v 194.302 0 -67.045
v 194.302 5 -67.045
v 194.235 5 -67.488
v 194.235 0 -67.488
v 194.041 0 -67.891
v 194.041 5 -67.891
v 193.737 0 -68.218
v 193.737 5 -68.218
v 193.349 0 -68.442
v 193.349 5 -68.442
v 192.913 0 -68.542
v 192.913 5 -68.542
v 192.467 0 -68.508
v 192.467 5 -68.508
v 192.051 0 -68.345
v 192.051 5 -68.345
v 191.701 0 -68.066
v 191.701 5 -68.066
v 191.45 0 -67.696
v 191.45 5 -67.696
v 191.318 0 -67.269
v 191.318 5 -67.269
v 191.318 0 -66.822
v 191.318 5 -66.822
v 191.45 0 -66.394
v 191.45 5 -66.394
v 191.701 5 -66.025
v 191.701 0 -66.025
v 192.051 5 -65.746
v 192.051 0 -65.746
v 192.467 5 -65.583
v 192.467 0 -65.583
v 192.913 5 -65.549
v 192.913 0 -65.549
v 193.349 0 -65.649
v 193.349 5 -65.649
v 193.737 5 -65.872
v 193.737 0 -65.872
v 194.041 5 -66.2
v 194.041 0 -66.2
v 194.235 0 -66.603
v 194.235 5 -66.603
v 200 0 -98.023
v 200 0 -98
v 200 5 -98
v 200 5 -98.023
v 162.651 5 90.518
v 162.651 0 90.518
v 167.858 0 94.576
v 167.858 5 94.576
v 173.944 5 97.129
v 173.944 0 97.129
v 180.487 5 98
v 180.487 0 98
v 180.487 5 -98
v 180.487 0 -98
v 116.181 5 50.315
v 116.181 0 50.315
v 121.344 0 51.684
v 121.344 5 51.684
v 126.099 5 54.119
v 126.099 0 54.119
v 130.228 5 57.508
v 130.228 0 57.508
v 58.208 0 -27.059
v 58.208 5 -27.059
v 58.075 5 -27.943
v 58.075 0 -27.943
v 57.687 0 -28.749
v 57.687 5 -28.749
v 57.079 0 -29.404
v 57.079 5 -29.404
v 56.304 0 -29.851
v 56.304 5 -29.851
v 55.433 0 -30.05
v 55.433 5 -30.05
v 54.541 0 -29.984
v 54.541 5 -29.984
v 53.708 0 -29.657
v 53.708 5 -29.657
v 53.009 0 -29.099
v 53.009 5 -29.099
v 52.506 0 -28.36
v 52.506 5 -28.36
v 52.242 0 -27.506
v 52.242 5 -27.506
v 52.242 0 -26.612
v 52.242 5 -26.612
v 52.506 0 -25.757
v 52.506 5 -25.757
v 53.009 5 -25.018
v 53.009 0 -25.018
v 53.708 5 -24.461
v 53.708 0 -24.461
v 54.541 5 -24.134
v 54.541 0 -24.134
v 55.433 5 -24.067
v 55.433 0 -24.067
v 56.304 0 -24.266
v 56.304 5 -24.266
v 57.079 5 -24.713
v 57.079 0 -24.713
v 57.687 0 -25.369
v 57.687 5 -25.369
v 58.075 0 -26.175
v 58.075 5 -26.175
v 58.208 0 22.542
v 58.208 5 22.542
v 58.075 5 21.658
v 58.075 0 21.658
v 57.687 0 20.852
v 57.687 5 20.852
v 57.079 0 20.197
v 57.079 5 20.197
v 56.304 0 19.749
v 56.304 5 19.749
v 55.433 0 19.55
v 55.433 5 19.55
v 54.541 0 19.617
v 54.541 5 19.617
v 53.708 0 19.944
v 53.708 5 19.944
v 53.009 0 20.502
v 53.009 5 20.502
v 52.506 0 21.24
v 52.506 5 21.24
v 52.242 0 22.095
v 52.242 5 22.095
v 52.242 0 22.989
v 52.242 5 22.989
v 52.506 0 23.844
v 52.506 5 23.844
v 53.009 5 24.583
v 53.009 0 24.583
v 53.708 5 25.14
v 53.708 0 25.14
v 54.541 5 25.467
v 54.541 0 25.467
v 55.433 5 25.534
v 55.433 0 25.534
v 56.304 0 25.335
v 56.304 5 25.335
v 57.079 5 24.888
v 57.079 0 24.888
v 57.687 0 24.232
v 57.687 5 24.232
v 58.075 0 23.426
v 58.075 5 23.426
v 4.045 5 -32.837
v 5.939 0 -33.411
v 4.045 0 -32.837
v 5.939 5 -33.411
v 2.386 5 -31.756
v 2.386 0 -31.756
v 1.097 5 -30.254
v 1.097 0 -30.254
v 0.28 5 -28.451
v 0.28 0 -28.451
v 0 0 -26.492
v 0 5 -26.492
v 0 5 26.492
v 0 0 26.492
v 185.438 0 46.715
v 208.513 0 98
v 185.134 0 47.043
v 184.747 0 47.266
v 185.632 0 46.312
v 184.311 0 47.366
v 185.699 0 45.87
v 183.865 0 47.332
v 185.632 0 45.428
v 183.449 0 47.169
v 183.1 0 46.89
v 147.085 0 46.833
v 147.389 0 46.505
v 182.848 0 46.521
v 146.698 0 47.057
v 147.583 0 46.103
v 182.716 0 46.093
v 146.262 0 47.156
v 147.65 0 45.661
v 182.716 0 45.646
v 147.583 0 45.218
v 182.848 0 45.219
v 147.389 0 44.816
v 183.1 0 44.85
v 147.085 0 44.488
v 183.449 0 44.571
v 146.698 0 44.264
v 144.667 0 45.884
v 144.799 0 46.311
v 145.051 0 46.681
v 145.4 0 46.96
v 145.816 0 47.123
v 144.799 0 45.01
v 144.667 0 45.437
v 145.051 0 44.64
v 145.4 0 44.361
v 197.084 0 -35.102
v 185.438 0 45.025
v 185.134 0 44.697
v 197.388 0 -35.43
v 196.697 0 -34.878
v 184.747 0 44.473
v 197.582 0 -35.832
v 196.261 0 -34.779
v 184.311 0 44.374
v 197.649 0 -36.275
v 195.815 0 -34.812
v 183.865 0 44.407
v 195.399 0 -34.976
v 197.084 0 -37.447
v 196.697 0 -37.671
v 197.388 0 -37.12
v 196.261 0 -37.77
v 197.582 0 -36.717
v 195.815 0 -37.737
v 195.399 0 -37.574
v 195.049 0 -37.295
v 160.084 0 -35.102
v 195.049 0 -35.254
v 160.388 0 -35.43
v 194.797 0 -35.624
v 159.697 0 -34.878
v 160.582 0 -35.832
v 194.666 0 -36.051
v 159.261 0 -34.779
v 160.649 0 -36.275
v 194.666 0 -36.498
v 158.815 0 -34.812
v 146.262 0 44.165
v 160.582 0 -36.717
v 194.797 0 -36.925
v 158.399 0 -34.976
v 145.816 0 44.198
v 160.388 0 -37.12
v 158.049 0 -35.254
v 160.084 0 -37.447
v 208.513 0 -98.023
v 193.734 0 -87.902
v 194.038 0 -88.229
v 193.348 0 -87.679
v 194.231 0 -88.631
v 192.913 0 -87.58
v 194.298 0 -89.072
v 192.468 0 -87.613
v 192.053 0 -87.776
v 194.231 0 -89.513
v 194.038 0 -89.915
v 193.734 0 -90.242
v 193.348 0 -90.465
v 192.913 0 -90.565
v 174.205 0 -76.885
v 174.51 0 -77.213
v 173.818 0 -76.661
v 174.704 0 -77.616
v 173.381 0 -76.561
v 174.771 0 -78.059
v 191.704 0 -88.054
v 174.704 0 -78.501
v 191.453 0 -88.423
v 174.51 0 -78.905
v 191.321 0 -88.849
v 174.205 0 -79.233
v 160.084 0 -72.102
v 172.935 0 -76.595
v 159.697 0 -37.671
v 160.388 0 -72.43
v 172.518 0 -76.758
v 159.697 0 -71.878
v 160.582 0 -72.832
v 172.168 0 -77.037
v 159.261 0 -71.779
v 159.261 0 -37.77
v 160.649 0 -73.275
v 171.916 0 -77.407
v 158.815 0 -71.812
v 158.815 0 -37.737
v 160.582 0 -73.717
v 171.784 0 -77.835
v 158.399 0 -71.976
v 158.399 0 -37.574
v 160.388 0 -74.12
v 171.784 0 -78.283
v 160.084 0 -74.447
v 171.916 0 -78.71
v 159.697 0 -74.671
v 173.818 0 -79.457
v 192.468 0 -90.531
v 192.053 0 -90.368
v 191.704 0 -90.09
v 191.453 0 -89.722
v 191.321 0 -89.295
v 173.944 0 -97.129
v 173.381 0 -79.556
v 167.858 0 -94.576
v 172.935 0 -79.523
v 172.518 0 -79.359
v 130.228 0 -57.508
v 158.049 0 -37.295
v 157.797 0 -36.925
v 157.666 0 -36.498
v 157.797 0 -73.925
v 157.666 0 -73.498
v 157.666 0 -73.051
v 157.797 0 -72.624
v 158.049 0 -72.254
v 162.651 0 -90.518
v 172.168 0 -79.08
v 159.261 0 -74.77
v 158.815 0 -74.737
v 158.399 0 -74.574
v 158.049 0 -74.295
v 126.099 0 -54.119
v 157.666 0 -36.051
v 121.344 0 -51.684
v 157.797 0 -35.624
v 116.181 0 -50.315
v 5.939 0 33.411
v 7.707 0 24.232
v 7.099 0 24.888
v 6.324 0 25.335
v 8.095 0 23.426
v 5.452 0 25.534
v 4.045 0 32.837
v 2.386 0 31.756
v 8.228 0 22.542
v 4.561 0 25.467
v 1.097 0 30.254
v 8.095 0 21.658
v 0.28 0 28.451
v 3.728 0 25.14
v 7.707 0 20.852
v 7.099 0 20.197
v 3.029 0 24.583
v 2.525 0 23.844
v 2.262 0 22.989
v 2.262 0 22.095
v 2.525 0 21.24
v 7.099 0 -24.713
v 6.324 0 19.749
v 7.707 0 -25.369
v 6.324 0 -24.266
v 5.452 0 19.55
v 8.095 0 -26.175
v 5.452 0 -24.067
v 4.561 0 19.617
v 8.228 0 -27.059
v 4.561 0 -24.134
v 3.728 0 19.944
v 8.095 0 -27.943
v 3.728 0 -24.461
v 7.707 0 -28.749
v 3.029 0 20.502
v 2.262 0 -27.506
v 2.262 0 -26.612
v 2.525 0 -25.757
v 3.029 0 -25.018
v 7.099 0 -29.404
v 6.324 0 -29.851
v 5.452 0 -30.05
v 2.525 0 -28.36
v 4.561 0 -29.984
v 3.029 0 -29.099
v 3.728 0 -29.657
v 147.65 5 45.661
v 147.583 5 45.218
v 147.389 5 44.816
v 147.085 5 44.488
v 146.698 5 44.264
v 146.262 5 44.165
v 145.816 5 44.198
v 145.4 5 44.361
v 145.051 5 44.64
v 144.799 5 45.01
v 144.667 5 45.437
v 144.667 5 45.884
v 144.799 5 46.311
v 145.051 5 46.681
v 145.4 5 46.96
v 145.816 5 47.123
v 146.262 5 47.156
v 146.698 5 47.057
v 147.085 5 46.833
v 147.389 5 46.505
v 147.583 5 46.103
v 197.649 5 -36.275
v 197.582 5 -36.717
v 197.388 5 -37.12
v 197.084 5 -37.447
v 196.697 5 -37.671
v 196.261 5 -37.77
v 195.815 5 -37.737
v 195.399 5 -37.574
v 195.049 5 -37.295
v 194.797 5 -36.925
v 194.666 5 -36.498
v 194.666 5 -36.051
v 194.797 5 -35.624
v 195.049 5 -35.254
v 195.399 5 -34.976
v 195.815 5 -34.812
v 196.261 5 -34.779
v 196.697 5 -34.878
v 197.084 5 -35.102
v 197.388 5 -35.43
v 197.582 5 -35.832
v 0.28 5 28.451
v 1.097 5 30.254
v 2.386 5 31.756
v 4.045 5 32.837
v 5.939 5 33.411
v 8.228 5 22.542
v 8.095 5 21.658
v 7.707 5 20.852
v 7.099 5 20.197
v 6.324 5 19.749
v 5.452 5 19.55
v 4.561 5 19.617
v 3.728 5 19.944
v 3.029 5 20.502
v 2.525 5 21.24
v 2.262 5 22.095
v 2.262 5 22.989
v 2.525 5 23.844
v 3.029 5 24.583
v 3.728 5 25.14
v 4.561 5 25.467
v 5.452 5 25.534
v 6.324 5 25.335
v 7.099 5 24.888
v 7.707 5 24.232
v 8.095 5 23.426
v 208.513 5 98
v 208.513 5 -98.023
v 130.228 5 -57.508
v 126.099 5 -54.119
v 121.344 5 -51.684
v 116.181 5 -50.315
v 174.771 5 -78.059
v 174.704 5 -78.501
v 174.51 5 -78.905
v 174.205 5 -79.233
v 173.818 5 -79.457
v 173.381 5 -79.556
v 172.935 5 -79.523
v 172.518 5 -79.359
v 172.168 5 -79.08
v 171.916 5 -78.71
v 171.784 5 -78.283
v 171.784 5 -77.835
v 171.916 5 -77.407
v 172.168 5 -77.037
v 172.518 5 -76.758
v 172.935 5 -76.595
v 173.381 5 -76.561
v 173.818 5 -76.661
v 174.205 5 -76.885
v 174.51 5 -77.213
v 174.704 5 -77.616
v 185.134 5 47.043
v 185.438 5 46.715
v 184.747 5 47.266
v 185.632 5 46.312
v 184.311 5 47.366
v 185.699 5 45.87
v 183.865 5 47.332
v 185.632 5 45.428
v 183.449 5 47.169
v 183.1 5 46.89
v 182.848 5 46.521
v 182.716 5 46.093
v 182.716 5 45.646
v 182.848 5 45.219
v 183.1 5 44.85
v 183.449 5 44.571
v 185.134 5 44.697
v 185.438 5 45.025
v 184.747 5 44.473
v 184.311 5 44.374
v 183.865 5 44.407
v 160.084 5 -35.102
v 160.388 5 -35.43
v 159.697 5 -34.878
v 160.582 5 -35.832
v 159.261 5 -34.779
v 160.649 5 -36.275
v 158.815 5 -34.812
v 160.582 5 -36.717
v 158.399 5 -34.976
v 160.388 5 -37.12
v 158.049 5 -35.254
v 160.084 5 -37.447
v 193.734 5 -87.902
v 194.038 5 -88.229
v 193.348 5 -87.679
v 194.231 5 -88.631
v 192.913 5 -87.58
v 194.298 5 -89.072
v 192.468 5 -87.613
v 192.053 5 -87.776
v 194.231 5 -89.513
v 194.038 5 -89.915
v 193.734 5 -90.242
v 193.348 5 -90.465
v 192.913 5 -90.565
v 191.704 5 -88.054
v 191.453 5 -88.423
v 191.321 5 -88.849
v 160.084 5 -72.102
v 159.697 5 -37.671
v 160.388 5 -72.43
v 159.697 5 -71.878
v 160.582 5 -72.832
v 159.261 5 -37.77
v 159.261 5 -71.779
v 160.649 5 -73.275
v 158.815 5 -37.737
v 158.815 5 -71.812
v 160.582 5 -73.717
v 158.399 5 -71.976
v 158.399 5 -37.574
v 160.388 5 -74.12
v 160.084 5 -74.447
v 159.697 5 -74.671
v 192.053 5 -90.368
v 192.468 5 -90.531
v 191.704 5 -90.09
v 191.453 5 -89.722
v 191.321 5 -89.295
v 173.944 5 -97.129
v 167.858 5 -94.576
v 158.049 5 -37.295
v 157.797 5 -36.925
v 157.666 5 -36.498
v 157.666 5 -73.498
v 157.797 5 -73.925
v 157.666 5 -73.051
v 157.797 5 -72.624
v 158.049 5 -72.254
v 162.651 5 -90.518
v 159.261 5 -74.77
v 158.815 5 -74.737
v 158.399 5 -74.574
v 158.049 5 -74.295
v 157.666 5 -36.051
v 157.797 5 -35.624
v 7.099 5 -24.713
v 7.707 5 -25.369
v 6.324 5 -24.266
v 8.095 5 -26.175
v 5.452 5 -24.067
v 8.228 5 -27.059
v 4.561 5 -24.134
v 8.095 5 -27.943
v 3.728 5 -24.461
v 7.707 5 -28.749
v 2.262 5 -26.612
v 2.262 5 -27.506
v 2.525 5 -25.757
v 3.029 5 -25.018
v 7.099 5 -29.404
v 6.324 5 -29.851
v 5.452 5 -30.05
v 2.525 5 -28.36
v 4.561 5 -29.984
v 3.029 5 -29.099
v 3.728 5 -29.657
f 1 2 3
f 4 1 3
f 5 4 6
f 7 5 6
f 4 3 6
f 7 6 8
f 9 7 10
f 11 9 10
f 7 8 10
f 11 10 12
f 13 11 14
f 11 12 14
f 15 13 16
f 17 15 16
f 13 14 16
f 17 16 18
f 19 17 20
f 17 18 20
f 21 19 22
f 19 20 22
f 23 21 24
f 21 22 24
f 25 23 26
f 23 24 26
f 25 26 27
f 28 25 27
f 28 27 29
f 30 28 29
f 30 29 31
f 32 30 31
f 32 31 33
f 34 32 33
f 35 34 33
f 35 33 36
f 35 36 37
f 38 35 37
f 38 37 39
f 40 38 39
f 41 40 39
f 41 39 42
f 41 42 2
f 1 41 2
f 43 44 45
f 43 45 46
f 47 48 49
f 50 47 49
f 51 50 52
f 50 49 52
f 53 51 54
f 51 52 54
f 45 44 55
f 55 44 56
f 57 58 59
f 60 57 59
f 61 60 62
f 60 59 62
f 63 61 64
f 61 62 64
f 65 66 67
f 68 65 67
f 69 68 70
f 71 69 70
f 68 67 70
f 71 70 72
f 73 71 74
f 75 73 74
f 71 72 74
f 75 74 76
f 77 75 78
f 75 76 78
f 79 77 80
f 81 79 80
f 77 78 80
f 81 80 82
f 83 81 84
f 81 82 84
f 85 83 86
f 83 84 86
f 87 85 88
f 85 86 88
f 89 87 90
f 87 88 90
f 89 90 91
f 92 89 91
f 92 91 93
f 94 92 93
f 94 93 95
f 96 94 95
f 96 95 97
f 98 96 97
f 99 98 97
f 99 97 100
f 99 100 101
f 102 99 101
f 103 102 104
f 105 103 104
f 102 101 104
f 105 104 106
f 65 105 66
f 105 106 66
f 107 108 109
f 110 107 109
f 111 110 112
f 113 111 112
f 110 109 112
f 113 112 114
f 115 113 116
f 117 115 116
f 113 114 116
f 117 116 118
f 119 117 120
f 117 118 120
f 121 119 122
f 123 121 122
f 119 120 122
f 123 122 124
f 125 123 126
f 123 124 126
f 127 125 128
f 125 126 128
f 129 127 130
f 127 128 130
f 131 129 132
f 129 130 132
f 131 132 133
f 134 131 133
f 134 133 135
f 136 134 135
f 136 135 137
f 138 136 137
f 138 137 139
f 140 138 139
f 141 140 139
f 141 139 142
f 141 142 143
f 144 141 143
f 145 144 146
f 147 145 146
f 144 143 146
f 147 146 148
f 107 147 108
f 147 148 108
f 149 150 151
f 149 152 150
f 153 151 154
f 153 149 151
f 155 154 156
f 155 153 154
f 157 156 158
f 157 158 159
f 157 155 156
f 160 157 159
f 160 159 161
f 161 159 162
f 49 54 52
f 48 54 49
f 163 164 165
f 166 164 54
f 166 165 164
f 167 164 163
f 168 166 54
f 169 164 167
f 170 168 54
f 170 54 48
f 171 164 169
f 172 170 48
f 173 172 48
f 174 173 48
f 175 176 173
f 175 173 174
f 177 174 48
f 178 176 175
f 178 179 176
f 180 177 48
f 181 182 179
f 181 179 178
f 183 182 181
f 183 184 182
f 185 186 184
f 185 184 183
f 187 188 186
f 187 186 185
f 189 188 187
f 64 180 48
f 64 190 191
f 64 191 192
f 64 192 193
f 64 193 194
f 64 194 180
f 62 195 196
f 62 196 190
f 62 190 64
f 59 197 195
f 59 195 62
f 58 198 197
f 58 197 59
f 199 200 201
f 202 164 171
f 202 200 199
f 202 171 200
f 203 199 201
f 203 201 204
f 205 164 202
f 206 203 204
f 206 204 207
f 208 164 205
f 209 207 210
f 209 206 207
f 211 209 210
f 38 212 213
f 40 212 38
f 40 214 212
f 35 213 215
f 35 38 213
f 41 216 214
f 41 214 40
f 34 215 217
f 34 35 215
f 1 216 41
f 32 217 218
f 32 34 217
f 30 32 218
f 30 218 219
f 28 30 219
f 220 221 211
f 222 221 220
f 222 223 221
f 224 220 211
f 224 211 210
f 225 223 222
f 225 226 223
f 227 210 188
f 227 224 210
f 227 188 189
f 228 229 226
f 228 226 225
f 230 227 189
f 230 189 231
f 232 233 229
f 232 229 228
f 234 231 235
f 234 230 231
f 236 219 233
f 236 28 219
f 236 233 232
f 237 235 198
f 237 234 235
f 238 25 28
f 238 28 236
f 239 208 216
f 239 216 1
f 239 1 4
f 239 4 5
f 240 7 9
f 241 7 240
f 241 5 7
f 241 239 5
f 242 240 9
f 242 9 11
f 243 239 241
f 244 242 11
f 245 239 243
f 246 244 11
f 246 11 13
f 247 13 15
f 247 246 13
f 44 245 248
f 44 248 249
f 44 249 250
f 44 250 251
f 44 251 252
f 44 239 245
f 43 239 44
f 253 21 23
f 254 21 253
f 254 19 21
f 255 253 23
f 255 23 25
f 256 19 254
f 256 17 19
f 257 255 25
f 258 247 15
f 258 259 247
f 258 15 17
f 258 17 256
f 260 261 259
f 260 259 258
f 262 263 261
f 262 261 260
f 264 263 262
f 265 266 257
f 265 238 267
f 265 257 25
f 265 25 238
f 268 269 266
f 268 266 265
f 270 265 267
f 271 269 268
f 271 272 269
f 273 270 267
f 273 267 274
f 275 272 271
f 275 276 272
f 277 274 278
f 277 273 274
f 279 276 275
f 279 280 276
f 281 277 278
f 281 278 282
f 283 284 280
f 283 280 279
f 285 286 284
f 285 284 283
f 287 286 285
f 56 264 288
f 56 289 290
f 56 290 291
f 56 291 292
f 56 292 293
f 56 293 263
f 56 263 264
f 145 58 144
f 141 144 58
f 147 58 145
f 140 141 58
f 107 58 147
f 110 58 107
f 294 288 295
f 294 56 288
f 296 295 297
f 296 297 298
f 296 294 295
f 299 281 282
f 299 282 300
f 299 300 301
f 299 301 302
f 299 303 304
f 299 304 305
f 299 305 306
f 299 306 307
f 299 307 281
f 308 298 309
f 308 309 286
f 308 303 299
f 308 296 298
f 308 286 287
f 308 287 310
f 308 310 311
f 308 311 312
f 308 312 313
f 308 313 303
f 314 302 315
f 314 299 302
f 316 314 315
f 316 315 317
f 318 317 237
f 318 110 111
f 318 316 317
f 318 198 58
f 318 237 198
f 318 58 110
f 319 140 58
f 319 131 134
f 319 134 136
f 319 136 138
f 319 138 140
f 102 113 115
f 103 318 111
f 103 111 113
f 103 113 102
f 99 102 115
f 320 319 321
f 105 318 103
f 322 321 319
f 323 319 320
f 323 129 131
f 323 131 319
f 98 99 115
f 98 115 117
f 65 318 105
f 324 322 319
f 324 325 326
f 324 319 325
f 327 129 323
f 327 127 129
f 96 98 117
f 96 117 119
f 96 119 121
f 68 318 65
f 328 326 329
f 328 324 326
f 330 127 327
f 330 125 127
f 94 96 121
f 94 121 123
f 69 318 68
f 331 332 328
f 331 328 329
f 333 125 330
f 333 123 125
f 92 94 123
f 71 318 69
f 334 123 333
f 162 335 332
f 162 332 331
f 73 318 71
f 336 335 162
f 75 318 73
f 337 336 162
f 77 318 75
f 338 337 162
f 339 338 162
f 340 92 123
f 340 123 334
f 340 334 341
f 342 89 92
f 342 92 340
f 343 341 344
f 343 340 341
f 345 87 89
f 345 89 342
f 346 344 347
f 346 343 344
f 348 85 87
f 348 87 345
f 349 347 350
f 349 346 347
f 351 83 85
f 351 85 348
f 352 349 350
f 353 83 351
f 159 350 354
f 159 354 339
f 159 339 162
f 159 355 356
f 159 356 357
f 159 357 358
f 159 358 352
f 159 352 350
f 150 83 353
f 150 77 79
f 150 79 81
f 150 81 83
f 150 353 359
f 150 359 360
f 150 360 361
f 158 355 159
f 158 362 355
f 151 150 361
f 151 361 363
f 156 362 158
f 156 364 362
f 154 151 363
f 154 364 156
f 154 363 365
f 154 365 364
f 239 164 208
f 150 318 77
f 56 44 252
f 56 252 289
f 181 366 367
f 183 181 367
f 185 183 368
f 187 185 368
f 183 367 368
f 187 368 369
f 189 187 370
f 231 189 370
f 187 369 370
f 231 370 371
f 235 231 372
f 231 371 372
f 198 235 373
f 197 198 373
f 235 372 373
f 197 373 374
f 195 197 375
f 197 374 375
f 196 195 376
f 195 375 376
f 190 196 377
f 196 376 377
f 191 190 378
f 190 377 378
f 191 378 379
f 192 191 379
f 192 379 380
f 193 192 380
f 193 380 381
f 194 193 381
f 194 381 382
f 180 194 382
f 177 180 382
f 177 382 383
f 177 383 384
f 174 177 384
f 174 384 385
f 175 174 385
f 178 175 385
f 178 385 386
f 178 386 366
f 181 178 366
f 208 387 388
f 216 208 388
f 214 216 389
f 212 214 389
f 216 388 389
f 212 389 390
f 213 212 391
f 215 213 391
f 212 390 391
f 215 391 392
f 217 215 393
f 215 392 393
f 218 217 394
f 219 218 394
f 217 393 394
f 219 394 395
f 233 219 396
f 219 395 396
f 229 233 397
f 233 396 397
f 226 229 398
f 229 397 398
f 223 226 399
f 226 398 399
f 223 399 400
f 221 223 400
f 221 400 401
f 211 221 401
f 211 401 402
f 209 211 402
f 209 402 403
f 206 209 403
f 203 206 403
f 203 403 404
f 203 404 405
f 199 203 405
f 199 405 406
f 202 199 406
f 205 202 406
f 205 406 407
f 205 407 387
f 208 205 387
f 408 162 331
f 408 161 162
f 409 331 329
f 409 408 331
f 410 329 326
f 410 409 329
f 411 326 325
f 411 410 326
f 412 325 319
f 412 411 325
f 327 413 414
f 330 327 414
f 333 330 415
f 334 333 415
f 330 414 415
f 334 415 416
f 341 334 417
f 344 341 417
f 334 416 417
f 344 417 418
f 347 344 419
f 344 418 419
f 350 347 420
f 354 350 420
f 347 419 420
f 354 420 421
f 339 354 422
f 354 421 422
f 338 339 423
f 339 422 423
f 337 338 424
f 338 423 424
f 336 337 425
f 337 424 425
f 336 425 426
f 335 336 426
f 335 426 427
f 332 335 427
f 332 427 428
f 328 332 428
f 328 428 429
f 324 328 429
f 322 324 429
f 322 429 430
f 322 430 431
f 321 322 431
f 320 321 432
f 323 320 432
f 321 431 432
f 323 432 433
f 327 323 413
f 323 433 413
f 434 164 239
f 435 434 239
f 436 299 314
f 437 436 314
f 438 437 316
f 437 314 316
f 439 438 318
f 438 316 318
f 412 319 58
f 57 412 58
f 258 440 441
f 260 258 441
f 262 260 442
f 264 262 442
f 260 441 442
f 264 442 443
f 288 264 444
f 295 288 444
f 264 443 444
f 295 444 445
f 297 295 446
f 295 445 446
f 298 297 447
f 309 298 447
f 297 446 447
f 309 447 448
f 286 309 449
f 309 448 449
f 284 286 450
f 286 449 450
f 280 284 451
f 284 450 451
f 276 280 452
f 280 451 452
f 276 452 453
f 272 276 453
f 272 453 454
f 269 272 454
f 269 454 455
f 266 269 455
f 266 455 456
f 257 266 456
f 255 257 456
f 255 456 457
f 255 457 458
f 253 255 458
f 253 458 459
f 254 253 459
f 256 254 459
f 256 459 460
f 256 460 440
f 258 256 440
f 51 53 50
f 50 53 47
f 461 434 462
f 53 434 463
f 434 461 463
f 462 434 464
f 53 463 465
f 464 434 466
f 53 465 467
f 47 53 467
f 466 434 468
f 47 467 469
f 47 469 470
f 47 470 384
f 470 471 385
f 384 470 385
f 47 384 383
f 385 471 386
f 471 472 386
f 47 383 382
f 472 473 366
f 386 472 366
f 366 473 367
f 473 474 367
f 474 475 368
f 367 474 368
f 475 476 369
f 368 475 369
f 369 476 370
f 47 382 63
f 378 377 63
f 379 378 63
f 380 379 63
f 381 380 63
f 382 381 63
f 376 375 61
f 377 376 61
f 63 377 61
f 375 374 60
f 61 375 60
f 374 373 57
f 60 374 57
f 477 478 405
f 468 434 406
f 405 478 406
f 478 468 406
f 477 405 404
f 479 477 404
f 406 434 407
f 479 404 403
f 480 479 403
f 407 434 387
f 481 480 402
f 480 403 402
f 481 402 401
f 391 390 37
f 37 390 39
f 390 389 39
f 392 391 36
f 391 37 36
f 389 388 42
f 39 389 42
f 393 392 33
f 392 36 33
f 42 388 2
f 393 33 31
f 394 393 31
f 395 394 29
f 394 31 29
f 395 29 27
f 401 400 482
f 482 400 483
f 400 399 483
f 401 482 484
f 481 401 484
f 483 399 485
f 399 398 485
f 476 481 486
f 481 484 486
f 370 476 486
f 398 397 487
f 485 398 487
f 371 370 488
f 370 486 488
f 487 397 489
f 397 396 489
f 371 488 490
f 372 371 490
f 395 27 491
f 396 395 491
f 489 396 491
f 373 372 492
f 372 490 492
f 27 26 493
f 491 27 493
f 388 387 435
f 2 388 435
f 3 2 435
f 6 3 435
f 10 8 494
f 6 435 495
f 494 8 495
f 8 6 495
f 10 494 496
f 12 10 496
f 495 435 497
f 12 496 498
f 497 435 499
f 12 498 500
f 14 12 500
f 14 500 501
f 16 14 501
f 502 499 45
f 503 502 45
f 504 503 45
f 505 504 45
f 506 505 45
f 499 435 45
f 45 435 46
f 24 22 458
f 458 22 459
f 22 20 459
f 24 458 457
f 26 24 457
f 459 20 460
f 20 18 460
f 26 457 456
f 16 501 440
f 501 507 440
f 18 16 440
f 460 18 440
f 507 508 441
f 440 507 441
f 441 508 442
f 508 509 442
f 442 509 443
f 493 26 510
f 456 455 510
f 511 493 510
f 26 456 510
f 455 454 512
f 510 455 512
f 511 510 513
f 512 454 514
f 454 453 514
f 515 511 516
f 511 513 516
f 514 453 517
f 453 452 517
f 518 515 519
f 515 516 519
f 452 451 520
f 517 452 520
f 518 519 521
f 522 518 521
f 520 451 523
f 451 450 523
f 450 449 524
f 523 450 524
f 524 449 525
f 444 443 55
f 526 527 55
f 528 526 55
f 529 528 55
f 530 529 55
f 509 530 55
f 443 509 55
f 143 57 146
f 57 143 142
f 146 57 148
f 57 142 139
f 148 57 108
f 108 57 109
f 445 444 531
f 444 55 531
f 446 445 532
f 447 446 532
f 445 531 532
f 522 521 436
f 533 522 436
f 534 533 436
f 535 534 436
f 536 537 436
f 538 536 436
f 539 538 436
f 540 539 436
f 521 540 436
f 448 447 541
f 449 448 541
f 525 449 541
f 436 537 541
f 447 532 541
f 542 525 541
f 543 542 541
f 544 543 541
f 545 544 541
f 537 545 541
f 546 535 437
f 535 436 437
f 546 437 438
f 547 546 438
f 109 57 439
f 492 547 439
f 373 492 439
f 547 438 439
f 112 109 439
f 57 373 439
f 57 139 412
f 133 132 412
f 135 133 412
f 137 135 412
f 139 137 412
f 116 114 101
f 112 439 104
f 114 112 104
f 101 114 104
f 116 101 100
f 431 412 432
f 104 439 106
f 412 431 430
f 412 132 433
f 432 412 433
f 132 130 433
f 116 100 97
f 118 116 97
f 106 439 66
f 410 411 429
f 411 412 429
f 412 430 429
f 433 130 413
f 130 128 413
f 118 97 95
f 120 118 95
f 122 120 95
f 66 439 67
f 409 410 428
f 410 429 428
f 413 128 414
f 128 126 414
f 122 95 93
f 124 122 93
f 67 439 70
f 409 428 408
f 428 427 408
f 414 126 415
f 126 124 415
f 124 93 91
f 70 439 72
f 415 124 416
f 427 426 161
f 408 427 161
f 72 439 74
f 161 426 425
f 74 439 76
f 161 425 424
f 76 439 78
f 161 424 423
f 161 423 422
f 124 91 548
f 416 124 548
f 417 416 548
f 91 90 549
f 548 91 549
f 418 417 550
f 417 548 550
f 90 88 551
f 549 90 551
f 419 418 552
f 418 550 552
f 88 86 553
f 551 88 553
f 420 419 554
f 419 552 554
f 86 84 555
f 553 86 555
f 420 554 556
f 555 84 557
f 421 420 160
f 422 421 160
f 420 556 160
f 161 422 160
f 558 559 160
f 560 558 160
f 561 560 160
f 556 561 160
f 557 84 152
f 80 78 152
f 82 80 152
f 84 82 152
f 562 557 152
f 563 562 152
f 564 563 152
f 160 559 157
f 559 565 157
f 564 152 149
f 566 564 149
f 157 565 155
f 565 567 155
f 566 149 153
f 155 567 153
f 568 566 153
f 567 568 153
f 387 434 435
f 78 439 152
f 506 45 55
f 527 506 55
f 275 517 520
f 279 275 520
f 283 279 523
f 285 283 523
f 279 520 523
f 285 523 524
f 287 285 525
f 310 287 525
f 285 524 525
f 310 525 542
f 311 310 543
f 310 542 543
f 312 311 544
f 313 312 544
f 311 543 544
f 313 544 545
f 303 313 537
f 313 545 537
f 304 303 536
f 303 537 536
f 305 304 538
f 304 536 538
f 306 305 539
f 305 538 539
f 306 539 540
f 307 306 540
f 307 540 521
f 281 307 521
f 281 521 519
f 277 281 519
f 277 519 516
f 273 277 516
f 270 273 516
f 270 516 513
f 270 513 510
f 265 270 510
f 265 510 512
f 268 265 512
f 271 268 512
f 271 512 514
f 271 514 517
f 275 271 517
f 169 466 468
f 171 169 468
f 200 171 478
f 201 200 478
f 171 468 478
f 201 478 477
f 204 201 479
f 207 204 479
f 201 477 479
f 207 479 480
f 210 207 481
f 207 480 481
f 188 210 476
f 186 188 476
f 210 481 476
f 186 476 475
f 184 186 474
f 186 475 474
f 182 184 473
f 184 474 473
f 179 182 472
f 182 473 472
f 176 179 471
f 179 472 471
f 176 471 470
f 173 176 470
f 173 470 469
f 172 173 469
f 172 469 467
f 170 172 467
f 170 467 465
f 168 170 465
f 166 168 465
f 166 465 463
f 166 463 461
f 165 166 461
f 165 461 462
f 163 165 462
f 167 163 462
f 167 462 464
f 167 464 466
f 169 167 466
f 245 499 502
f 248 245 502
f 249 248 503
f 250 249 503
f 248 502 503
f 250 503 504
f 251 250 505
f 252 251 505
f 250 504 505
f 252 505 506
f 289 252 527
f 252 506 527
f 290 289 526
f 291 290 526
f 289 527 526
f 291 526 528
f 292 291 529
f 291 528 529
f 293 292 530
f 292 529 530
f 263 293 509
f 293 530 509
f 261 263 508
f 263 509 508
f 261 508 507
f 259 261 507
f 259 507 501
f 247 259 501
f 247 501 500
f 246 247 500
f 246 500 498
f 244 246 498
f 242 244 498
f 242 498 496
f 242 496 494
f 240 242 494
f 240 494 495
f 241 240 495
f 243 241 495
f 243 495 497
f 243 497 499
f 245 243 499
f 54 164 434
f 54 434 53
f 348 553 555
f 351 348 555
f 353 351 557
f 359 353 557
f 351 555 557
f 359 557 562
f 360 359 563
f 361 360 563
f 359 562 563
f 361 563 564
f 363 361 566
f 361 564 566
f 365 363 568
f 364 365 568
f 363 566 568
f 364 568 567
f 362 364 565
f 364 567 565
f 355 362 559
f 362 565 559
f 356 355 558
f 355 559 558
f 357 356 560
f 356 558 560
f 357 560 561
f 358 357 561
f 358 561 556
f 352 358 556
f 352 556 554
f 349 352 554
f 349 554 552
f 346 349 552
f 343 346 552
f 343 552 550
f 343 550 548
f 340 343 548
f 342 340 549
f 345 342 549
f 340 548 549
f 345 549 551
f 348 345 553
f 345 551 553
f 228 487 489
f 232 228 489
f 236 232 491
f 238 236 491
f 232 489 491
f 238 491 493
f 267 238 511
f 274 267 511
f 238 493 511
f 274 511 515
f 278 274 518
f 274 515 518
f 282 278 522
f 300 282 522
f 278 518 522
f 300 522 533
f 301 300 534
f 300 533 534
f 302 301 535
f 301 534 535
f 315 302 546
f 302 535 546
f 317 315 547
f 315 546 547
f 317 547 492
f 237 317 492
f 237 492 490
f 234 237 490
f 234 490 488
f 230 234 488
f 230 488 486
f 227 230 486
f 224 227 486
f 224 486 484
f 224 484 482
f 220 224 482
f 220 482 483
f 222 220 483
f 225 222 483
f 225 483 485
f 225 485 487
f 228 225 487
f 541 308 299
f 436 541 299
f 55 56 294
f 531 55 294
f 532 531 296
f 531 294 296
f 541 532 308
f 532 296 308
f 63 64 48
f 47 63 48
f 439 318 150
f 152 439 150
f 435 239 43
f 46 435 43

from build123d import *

# Parameters (mm, degrees)
BOSS_EXTRU_1_DEPTH      = 5
CONG_3_R                = 7
ESQUISSE3_R             = 3
ENL_V_MAT_EXTRU_1_DEPTH = 5
ESQUISSE8_R             = 1.5
ENL_V_MAT_EXTRU_5_DEPTH = 10
ESQUISSE11_R            = 1.5
ENL_V_MAT_EXTRU_7_DEPTH = 10
ESQUISSE12_W            = 8.513232075
ESQUISSE12_H            = 196.02308235
BOSS_EXTRU_2_DEPTH      = 5
ESQUISSE13_R            = 1.496707183
ESQUISSE13_R_2          = 1.50175208
ESQUISSE13_R_3          = 1.500339551
ENL_V_MAT_EXTRU_8_DEPTH = 10


with BuildPart() as part:
    # Esquisse1 → Boss.-Extru.1 (new body)
    with BuildSketch(Plane(origin=(0, 0, 0), x_dir=(1, 0, 0), z_dir=(0, 1, 0))):
        with BuildLine():
            Line((200, 98), (180.486918987, 98))
            ThreePointArc((180.486918987, 98), (170.816361757, 96.053857006), (162.651427502, 90.518425828))
            Line((162.651427502, 90.518425828), (130.227508241, 57.507666668))
            ThreePointArc((130.227508241, 57.507666668), (123.786759953, 52.773905469), (116.181163829, 50.314913559))
            Line((116.181163829, 50.314913559), (0, 32.5))
            Line((0, 32.5), (0, 19.62474242))
            Line((0, 19.62474242), (0, -19.62474242))
            Line((0, -19.62474242), (0, -32.5))
            Line((0, -32.5), (116.181163829, -50.314913559))
            ThreePointArc((116.181163829, -50.314913559), (123.786759953, -52.773905469), (130.227508241, -57.507666668))
            Line((130.227508241, -57.507666668), (162.651427502, -90.518425828))
            ThreePointArc((162.651427502, -90.518425828), (170.816361757, -96.053857006), (180.486918987, -98))
            Line((180.486918987, -98), (200, -98))
            Line((200, -98), (200, 98))
        make_face()
    extrude(amount=BOSS_EXTRU_1_DEPTH)

    # Congé3
    cong_3_edges = [part.edges().sort_by_distance(p)[0] for p in [
        (0, 2.5, 32.5),
        (0, 2.5, -32.5),
    ]]
    fillet(cong_3_edges, radius=CONG_3_R)

    # Esquisse3 → Enlèv. mat.-Extru.1 (cut)
    with BuildSketch(Plane(origin=(0, 5, 0), x_dir=(1, 0, 0), z_dir=(0, 1, 0))):
        with Locations((5.228132429, -22.542085275)):
            Circle(ESQUISSE3_R)
        with Locations((5.228132429, 27.05879269)):
            Circle(ESQUISSE3_R)
        with Locations((55.20842969, -22.542085275)):
            Circle(ESQUISSE3_R)
        with Locations((55.20842969, 27.05879269)):
            Circle(ESQUISSE3_R)
    extrude(amount=-ENL_V_MAT_EXTRU_1_DEPTH, mode=Mode.SUBTRACT)

    # Esquisse8 → Enlèv. mat.-Extru.5 (cut)
    with BuildSketch(Plane(origin=(0, 5, 0), x_dir=(1, 0, 0), z_dir=(0, 1, 0))):
        with Locations((196.148923391, 36.274574464)):
            Circle(ESQUISSE8_R)
        with Locations((159.148923391, 73.274574464)):
            Circle(ESQUISSE8_R)
        with Locations((159.148923391, 36.274574464)):
            Circle(ESQUISSE8_R)
    extrude(amount=-ENL_V_MAT_EXTRU_5_DEPTH, mode=Mode.SUBTRACT)

    # Esquisse11 → Enlèv. mat.-Extru.7 (cut)
    with BuildSketch(Plane(origin=(0, 5, 0), x_dir=(1, 0, 0), z_dir=(0, 1, 0))):
        with Locations((184.199116652, -45.869762424)):
            Circle(ESQUISSE11_R)
        with Locations((146.150097665, -45.660518454)):
            Circle(ESQUISSE11_R)
    extrude(amount=-ENL_V_MAT_EXTRU_7_DEPTH, mode=Mode.SUBTRACT)

    # Esquisse12 → Boss.-Extru.2 (add)
    with BuildSketch(Plane(origin=(0, 0, 0), x_dir=(-1, 0, 0), z_dir=(0, -1, 0))):
        with Locations((-204.256616038, 0.011541175)):
            Rectangle(ESQUISSE12_W, ESQUISSE12_H)
    extrude(amount=-BOSS_EXTRU_2_DEPTH)

    # Esquisse13 → Enlèv. mat.-Extru.8 (cut)
    with BuildSketch(Plane(origin=(0, 5, 0), x_dir=(1, 0, 0), z_dir=(0, 1, 0))):
        with Locations((192.801268115, 89.072215784)):
            Circle(ESQUISSE13_R)
        with Locations((173.269117951, 78.05884243)):
            Circle(ESQUISSE13_R_2)
        with Locations((192.801268115, 67.045469076)):
            Circle(ESQUISSE13_R_3)
    extrude(amount=-ENL_V_MAT_EXTRU_8_DEPTH, mode=Mode.SUBTRACT)


solid = part.part
